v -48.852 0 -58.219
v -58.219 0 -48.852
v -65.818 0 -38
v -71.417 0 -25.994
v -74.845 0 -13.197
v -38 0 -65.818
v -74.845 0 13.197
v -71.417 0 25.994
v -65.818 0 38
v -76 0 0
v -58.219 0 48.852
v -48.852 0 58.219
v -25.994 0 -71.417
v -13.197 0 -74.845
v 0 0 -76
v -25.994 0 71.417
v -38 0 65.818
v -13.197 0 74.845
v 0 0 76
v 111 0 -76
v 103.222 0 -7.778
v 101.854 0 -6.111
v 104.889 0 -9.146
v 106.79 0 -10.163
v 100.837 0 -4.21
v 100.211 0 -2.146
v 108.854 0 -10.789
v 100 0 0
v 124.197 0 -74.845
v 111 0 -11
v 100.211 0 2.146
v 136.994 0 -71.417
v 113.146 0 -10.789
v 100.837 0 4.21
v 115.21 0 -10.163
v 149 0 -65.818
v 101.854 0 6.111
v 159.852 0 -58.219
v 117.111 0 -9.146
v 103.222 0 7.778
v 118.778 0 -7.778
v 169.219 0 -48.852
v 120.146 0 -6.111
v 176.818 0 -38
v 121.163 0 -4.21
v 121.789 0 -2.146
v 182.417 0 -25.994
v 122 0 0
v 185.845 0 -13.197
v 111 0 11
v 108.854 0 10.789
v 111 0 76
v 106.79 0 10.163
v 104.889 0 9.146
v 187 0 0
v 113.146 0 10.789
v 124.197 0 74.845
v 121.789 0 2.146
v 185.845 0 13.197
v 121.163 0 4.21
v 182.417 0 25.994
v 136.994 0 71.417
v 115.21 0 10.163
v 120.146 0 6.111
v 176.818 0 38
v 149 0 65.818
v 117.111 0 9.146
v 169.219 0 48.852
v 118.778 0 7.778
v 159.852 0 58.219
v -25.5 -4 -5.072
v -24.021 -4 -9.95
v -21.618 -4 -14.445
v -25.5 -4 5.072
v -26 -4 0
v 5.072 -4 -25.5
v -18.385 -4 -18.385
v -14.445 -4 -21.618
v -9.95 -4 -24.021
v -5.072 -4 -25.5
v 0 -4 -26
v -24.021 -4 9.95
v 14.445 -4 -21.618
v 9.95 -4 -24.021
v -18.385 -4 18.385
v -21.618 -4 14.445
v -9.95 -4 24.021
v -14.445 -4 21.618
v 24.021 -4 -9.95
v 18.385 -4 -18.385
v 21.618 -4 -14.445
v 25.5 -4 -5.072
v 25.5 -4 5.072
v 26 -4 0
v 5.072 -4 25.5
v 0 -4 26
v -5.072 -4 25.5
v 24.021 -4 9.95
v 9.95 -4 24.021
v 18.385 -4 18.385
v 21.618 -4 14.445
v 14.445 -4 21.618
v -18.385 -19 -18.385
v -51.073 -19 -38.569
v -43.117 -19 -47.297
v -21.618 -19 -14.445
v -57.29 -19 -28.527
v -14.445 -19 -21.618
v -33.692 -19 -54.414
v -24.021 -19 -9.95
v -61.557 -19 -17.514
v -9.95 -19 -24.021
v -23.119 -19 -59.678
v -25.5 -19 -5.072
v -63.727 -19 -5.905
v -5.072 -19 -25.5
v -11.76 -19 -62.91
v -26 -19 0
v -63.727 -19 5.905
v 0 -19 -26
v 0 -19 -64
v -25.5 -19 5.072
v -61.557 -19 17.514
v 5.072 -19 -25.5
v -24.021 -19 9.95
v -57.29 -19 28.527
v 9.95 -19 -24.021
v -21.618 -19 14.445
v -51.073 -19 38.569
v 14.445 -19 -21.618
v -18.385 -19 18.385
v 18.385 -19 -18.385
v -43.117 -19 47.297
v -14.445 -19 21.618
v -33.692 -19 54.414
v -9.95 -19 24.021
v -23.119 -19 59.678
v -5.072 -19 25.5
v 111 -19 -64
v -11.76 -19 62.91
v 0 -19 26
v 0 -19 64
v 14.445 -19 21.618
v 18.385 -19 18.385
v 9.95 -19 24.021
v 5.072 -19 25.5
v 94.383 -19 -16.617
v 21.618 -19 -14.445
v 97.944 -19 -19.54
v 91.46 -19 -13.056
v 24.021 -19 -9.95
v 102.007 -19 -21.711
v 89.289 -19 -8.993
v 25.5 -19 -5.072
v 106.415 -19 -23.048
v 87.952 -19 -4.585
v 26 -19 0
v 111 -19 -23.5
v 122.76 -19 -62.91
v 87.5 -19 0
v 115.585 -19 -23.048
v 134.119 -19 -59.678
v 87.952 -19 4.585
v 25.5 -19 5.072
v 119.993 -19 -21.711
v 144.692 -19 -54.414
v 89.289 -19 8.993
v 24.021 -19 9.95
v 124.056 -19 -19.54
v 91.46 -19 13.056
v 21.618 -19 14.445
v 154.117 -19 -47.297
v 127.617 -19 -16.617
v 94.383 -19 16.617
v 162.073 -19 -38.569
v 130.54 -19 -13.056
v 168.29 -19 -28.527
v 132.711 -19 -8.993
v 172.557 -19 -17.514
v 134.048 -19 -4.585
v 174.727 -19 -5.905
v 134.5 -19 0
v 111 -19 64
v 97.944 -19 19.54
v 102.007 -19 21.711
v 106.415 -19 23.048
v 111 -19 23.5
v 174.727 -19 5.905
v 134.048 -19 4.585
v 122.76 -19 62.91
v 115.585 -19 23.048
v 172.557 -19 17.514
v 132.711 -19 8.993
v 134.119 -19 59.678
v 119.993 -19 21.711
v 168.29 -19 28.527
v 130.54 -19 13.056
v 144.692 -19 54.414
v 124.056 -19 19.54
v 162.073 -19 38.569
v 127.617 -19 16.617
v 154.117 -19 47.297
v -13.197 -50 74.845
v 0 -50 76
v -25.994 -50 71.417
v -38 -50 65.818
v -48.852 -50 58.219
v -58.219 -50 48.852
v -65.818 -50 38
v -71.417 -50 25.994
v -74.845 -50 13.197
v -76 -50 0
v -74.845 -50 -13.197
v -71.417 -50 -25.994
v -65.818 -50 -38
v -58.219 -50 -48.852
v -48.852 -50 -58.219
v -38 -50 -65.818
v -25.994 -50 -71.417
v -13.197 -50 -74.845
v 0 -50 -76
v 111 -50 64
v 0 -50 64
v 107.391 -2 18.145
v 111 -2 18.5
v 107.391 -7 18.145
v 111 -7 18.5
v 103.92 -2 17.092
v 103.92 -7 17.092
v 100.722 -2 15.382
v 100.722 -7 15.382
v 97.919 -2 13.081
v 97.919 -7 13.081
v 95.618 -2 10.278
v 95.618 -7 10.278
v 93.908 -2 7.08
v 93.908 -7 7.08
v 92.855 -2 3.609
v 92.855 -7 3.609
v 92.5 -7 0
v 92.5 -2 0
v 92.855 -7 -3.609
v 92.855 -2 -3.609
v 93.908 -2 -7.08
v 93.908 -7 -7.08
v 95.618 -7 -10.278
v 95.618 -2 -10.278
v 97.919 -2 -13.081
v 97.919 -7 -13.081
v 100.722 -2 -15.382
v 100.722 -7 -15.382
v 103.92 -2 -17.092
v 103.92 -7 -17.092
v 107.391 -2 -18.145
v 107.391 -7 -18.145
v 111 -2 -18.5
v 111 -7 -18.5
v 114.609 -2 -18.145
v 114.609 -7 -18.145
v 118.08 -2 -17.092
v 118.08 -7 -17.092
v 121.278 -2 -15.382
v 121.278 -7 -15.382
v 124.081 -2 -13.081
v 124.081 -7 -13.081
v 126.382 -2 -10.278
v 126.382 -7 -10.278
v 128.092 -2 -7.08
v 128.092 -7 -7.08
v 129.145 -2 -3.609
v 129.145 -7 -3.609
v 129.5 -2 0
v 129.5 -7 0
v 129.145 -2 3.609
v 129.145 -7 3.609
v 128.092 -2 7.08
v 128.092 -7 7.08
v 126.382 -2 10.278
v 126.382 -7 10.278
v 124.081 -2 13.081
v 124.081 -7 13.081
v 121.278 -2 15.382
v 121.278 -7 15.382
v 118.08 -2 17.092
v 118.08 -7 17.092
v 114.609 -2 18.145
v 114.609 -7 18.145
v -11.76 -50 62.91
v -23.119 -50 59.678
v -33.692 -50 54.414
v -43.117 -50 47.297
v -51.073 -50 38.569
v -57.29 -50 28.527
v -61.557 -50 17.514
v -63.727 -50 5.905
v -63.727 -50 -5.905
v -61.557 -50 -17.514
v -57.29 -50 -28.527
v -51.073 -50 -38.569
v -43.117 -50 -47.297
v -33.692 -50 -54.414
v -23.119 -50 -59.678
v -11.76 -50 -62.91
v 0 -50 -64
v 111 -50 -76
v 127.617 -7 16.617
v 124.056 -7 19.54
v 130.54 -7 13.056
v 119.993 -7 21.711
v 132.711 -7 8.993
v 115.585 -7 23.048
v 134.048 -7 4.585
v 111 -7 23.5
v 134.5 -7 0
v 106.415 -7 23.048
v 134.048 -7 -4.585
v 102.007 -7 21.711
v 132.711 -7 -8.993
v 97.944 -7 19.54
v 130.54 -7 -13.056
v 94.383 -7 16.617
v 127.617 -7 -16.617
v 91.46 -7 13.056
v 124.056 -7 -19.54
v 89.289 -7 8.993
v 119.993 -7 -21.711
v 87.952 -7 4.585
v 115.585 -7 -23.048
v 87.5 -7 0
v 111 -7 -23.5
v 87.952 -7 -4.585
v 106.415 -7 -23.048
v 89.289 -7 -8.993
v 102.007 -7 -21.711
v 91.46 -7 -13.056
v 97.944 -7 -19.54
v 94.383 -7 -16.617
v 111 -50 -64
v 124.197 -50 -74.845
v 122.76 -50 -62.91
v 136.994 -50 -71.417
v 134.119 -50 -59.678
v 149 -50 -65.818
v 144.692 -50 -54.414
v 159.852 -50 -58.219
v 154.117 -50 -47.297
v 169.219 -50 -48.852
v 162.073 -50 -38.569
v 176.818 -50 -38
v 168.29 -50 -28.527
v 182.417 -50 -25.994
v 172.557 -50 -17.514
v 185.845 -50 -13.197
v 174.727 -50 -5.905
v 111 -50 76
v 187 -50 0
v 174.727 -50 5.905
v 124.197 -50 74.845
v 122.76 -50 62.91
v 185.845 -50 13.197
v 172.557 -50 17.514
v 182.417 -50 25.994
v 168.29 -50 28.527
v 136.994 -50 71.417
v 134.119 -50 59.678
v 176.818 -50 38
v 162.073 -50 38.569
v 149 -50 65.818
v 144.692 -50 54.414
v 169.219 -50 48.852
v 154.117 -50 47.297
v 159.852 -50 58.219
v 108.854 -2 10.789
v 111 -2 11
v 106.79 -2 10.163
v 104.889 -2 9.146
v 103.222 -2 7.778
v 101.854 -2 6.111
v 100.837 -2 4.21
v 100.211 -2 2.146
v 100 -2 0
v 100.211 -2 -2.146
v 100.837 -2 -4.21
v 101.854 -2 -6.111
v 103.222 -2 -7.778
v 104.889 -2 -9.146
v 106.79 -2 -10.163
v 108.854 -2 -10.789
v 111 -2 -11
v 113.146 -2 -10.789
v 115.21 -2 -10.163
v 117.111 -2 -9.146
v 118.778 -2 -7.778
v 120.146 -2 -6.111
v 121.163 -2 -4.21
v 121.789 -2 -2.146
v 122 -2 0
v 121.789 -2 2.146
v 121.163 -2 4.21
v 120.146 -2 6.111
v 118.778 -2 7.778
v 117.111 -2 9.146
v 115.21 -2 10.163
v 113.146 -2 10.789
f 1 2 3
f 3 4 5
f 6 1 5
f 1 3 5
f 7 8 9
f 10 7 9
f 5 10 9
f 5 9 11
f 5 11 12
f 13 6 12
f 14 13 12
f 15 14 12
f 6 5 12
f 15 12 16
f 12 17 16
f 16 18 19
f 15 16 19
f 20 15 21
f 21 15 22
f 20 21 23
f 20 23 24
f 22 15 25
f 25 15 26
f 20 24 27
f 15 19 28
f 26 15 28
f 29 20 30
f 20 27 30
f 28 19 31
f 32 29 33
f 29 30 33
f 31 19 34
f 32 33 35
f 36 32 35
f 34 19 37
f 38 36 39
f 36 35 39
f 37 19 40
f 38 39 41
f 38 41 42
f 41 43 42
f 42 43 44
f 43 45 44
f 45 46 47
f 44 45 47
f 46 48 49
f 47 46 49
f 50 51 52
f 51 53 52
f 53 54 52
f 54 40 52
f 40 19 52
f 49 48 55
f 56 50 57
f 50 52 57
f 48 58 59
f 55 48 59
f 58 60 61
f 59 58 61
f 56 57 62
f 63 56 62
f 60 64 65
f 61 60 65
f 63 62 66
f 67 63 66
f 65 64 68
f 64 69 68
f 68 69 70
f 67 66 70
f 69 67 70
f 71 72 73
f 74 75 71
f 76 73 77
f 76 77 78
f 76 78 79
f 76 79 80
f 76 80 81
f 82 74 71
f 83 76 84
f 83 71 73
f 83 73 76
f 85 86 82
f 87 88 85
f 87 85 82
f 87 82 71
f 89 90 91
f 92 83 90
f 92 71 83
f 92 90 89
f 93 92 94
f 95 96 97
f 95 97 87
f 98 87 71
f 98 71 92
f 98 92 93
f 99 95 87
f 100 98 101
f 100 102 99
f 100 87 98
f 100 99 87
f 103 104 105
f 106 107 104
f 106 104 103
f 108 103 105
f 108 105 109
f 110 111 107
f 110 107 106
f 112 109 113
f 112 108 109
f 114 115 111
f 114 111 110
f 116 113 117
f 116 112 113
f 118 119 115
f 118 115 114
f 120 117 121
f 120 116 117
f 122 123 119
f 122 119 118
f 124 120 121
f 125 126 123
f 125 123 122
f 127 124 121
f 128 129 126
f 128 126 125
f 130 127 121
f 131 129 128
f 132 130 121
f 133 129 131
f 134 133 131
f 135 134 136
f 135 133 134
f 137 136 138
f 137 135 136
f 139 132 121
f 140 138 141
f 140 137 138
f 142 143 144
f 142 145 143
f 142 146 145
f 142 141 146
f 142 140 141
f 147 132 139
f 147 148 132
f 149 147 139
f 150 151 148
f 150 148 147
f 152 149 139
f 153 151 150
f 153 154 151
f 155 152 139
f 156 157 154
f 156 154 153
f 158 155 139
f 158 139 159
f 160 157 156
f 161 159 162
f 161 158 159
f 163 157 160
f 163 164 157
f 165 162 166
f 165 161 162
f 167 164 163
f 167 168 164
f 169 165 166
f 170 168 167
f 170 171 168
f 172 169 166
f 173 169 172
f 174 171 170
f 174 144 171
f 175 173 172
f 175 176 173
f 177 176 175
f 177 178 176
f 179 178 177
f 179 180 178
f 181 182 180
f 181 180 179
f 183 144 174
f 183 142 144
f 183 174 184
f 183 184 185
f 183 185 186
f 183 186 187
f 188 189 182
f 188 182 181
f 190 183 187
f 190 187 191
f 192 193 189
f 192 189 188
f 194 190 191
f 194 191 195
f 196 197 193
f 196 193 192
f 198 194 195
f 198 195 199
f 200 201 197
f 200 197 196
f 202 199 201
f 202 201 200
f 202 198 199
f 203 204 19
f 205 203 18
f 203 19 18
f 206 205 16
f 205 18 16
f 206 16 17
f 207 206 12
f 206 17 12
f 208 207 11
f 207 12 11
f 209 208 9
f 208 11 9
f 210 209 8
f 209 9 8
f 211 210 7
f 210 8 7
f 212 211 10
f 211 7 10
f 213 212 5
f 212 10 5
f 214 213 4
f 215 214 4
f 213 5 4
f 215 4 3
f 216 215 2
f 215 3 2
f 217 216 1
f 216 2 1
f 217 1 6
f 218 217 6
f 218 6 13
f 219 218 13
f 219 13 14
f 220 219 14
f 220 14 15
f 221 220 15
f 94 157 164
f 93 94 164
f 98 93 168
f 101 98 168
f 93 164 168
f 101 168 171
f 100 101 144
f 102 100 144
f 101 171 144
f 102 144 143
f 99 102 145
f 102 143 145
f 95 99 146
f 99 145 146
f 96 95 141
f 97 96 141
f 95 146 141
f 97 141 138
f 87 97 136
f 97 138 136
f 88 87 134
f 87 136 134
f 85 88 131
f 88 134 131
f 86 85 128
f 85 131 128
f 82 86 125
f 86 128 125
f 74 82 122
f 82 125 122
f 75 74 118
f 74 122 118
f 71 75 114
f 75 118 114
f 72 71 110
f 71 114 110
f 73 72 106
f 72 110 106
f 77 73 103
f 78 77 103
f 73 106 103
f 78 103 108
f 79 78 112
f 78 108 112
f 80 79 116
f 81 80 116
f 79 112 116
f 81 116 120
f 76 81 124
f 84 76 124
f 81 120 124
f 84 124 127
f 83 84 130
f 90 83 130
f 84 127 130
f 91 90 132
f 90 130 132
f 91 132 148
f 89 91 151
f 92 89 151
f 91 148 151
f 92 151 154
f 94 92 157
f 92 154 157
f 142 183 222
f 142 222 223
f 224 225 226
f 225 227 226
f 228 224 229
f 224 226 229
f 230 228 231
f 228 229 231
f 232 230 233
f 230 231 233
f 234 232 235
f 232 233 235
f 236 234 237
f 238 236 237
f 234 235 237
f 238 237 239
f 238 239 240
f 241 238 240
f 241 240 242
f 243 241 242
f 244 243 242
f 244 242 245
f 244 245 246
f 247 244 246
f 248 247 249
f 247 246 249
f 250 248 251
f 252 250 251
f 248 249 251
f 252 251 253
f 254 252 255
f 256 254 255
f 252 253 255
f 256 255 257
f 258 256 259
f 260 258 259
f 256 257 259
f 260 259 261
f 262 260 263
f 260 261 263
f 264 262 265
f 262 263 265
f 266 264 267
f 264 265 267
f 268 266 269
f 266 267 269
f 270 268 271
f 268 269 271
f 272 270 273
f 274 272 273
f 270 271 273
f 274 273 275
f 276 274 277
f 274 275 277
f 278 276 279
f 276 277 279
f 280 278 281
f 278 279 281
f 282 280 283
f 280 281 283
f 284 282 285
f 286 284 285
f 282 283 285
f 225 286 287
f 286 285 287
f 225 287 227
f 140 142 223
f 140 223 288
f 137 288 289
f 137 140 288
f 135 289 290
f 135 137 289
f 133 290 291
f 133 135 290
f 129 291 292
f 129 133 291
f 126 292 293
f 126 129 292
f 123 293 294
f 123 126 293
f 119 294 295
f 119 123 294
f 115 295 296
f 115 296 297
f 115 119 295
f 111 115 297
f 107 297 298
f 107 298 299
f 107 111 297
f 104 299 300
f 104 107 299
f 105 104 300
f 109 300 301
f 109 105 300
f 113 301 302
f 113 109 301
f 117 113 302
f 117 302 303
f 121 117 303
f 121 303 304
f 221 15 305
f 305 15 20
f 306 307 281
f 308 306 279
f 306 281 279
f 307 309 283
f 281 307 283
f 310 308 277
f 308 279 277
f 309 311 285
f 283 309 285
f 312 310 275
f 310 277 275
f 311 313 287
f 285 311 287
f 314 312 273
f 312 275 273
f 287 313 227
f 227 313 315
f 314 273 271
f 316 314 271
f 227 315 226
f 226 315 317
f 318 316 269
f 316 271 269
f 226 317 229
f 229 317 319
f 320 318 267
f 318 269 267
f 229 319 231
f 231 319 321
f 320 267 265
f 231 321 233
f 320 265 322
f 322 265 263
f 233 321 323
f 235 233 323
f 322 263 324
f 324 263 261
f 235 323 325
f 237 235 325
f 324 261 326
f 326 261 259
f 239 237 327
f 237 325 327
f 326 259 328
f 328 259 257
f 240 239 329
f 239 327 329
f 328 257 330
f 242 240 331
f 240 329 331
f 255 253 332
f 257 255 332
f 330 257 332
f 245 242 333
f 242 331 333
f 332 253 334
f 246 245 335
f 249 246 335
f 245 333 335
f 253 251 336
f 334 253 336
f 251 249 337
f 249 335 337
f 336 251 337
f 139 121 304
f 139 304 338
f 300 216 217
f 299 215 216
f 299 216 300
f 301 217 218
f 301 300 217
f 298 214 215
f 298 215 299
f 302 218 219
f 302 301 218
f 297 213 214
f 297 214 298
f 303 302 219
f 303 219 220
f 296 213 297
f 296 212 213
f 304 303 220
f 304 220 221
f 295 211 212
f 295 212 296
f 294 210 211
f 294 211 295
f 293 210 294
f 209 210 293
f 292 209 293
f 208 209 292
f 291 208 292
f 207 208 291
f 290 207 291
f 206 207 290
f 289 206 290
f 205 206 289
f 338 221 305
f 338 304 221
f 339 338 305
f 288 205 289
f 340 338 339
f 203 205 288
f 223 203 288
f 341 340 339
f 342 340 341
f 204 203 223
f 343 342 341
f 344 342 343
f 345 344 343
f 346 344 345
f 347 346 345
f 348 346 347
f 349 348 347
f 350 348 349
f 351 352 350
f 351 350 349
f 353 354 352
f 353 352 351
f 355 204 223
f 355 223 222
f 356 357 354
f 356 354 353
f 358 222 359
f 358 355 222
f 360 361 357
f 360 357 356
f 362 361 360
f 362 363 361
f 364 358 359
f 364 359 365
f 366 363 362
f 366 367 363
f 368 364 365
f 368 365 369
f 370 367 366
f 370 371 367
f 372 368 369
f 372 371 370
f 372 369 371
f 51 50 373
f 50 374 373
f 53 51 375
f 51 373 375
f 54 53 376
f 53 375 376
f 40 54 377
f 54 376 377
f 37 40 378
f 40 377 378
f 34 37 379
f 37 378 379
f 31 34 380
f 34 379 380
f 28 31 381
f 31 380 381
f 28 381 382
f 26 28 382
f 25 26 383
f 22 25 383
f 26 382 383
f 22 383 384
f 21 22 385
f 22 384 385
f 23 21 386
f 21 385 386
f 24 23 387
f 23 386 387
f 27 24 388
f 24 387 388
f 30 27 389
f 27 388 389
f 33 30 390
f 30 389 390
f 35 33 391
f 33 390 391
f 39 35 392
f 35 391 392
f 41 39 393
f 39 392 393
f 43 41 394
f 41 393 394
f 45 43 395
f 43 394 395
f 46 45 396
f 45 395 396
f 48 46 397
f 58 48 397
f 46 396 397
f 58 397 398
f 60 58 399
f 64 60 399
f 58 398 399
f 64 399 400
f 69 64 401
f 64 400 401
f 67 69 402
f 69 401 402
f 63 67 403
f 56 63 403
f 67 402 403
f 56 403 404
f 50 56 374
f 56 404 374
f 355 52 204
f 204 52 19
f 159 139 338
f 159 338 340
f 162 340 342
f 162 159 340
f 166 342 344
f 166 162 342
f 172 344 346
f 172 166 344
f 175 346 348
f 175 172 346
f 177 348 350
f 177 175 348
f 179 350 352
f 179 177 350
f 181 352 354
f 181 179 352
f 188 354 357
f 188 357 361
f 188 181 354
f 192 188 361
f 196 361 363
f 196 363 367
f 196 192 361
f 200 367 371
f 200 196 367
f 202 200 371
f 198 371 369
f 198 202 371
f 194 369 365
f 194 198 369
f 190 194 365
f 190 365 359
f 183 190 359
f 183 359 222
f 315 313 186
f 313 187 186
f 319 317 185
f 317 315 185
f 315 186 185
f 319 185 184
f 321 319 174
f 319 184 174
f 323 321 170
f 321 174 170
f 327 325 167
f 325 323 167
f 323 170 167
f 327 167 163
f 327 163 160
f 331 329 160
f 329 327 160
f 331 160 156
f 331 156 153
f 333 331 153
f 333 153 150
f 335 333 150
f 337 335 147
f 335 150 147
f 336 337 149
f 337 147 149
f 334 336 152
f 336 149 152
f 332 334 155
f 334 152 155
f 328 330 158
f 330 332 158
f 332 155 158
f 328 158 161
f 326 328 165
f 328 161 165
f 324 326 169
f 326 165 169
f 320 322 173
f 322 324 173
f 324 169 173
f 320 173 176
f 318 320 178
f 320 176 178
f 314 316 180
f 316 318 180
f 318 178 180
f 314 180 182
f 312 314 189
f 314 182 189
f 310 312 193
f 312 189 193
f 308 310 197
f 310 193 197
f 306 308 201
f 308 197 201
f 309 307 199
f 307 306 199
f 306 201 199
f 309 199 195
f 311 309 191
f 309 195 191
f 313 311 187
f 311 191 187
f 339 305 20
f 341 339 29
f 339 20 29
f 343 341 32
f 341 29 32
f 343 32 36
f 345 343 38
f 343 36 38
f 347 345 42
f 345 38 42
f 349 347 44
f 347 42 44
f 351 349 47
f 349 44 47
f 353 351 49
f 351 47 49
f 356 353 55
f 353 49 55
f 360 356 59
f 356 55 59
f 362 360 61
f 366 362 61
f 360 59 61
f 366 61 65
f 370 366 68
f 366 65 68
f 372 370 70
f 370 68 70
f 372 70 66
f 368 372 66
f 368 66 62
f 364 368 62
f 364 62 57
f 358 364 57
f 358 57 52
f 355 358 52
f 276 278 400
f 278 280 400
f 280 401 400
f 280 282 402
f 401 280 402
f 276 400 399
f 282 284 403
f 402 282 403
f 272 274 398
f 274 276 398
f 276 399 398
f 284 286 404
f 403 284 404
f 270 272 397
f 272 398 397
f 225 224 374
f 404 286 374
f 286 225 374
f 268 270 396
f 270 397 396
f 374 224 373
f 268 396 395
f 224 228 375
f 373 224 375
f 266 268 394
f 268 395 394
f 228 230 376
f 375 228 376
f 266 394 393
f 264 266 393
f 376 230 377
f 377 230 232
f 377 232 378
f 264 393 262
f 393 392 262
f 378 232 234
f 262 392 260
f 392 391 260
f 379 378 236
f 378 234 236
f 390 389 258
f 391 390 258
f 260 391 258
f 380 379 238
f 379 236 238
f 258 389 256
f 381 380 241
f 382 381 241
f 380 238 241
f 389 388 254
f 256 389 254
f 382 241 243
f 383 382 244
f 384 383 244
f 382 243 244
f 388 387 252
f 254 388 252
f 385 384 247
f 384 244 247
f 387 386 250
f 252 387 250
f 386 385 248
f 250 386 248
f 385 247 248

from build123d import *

# Parameters (mm, degrees)
F2_DEPTH = 50
F4_DEPTH = 31
F5_R     = 26
F6_DEPTH = 15
F9_ANGLE = -360


with BuildPart() as f2:
    # F0 (on Front) → F2 (new body)
    with BuildSketch(Plane.XZ):
        with BuildLine():
            Line((111, 76), (0, 76))
            ThreePointArc((0, 76), (-76, 0), (0, -76))
            Line((0, -76), (111, -76))
            ThreePointArc((111, -76), (187, 0), (111, 76))
        make_face()
    extrude(amount=F2_DEPTH)

    # F3 (on offset) → F4 (cut)
    with BuildSketch(Plane.XZ.offset(19)):
        with BuildLine():
            Line((111, 64), (0, 64))
            ThreePointArc((0, 64), (-64, 0), (0, -64))
            Line((0, -64), (111, -64))
            ThreePointArc((111, -64), (175, 0), (111, 64))
        make_face()
    extrude(amount=F4_DEPTH, mode=Mode.SUBTRACT)

    # F5 (on offset) → F6 (cut)
    with BuildSketch(Plane.XZ.offset(19)):
        Circle(F5_R)
    extrude(amount=-F6_DEPTH, mode=Mode.SUBTRACT)

    # F8 (on offset) → F9 (revolve, symmetric, cut)
    with BuildSketch(Plane.YZ.offset(111)) as f9_sk:
        Polygon((-19, 0), (0, 0), (0, 11), (-2, 11), (-2, 18.5), (-7, 18.5), (-7, 23.5), (-19, 23.5), align=None)
    revolve(axis=Axis((111, -9.5, 0), (0, -1, 0)), revolution_arc=F9_ANGLE / 2, mode=Mode.SUBTRACT)
    revolve(f9_sk.sketch, axis=Axis((111, -9.5, 0), (0, 1, 0)), revolution_arc=F9_ANGLE / 2, mode=Mode.SUBTRACT)


solid = f2.part
